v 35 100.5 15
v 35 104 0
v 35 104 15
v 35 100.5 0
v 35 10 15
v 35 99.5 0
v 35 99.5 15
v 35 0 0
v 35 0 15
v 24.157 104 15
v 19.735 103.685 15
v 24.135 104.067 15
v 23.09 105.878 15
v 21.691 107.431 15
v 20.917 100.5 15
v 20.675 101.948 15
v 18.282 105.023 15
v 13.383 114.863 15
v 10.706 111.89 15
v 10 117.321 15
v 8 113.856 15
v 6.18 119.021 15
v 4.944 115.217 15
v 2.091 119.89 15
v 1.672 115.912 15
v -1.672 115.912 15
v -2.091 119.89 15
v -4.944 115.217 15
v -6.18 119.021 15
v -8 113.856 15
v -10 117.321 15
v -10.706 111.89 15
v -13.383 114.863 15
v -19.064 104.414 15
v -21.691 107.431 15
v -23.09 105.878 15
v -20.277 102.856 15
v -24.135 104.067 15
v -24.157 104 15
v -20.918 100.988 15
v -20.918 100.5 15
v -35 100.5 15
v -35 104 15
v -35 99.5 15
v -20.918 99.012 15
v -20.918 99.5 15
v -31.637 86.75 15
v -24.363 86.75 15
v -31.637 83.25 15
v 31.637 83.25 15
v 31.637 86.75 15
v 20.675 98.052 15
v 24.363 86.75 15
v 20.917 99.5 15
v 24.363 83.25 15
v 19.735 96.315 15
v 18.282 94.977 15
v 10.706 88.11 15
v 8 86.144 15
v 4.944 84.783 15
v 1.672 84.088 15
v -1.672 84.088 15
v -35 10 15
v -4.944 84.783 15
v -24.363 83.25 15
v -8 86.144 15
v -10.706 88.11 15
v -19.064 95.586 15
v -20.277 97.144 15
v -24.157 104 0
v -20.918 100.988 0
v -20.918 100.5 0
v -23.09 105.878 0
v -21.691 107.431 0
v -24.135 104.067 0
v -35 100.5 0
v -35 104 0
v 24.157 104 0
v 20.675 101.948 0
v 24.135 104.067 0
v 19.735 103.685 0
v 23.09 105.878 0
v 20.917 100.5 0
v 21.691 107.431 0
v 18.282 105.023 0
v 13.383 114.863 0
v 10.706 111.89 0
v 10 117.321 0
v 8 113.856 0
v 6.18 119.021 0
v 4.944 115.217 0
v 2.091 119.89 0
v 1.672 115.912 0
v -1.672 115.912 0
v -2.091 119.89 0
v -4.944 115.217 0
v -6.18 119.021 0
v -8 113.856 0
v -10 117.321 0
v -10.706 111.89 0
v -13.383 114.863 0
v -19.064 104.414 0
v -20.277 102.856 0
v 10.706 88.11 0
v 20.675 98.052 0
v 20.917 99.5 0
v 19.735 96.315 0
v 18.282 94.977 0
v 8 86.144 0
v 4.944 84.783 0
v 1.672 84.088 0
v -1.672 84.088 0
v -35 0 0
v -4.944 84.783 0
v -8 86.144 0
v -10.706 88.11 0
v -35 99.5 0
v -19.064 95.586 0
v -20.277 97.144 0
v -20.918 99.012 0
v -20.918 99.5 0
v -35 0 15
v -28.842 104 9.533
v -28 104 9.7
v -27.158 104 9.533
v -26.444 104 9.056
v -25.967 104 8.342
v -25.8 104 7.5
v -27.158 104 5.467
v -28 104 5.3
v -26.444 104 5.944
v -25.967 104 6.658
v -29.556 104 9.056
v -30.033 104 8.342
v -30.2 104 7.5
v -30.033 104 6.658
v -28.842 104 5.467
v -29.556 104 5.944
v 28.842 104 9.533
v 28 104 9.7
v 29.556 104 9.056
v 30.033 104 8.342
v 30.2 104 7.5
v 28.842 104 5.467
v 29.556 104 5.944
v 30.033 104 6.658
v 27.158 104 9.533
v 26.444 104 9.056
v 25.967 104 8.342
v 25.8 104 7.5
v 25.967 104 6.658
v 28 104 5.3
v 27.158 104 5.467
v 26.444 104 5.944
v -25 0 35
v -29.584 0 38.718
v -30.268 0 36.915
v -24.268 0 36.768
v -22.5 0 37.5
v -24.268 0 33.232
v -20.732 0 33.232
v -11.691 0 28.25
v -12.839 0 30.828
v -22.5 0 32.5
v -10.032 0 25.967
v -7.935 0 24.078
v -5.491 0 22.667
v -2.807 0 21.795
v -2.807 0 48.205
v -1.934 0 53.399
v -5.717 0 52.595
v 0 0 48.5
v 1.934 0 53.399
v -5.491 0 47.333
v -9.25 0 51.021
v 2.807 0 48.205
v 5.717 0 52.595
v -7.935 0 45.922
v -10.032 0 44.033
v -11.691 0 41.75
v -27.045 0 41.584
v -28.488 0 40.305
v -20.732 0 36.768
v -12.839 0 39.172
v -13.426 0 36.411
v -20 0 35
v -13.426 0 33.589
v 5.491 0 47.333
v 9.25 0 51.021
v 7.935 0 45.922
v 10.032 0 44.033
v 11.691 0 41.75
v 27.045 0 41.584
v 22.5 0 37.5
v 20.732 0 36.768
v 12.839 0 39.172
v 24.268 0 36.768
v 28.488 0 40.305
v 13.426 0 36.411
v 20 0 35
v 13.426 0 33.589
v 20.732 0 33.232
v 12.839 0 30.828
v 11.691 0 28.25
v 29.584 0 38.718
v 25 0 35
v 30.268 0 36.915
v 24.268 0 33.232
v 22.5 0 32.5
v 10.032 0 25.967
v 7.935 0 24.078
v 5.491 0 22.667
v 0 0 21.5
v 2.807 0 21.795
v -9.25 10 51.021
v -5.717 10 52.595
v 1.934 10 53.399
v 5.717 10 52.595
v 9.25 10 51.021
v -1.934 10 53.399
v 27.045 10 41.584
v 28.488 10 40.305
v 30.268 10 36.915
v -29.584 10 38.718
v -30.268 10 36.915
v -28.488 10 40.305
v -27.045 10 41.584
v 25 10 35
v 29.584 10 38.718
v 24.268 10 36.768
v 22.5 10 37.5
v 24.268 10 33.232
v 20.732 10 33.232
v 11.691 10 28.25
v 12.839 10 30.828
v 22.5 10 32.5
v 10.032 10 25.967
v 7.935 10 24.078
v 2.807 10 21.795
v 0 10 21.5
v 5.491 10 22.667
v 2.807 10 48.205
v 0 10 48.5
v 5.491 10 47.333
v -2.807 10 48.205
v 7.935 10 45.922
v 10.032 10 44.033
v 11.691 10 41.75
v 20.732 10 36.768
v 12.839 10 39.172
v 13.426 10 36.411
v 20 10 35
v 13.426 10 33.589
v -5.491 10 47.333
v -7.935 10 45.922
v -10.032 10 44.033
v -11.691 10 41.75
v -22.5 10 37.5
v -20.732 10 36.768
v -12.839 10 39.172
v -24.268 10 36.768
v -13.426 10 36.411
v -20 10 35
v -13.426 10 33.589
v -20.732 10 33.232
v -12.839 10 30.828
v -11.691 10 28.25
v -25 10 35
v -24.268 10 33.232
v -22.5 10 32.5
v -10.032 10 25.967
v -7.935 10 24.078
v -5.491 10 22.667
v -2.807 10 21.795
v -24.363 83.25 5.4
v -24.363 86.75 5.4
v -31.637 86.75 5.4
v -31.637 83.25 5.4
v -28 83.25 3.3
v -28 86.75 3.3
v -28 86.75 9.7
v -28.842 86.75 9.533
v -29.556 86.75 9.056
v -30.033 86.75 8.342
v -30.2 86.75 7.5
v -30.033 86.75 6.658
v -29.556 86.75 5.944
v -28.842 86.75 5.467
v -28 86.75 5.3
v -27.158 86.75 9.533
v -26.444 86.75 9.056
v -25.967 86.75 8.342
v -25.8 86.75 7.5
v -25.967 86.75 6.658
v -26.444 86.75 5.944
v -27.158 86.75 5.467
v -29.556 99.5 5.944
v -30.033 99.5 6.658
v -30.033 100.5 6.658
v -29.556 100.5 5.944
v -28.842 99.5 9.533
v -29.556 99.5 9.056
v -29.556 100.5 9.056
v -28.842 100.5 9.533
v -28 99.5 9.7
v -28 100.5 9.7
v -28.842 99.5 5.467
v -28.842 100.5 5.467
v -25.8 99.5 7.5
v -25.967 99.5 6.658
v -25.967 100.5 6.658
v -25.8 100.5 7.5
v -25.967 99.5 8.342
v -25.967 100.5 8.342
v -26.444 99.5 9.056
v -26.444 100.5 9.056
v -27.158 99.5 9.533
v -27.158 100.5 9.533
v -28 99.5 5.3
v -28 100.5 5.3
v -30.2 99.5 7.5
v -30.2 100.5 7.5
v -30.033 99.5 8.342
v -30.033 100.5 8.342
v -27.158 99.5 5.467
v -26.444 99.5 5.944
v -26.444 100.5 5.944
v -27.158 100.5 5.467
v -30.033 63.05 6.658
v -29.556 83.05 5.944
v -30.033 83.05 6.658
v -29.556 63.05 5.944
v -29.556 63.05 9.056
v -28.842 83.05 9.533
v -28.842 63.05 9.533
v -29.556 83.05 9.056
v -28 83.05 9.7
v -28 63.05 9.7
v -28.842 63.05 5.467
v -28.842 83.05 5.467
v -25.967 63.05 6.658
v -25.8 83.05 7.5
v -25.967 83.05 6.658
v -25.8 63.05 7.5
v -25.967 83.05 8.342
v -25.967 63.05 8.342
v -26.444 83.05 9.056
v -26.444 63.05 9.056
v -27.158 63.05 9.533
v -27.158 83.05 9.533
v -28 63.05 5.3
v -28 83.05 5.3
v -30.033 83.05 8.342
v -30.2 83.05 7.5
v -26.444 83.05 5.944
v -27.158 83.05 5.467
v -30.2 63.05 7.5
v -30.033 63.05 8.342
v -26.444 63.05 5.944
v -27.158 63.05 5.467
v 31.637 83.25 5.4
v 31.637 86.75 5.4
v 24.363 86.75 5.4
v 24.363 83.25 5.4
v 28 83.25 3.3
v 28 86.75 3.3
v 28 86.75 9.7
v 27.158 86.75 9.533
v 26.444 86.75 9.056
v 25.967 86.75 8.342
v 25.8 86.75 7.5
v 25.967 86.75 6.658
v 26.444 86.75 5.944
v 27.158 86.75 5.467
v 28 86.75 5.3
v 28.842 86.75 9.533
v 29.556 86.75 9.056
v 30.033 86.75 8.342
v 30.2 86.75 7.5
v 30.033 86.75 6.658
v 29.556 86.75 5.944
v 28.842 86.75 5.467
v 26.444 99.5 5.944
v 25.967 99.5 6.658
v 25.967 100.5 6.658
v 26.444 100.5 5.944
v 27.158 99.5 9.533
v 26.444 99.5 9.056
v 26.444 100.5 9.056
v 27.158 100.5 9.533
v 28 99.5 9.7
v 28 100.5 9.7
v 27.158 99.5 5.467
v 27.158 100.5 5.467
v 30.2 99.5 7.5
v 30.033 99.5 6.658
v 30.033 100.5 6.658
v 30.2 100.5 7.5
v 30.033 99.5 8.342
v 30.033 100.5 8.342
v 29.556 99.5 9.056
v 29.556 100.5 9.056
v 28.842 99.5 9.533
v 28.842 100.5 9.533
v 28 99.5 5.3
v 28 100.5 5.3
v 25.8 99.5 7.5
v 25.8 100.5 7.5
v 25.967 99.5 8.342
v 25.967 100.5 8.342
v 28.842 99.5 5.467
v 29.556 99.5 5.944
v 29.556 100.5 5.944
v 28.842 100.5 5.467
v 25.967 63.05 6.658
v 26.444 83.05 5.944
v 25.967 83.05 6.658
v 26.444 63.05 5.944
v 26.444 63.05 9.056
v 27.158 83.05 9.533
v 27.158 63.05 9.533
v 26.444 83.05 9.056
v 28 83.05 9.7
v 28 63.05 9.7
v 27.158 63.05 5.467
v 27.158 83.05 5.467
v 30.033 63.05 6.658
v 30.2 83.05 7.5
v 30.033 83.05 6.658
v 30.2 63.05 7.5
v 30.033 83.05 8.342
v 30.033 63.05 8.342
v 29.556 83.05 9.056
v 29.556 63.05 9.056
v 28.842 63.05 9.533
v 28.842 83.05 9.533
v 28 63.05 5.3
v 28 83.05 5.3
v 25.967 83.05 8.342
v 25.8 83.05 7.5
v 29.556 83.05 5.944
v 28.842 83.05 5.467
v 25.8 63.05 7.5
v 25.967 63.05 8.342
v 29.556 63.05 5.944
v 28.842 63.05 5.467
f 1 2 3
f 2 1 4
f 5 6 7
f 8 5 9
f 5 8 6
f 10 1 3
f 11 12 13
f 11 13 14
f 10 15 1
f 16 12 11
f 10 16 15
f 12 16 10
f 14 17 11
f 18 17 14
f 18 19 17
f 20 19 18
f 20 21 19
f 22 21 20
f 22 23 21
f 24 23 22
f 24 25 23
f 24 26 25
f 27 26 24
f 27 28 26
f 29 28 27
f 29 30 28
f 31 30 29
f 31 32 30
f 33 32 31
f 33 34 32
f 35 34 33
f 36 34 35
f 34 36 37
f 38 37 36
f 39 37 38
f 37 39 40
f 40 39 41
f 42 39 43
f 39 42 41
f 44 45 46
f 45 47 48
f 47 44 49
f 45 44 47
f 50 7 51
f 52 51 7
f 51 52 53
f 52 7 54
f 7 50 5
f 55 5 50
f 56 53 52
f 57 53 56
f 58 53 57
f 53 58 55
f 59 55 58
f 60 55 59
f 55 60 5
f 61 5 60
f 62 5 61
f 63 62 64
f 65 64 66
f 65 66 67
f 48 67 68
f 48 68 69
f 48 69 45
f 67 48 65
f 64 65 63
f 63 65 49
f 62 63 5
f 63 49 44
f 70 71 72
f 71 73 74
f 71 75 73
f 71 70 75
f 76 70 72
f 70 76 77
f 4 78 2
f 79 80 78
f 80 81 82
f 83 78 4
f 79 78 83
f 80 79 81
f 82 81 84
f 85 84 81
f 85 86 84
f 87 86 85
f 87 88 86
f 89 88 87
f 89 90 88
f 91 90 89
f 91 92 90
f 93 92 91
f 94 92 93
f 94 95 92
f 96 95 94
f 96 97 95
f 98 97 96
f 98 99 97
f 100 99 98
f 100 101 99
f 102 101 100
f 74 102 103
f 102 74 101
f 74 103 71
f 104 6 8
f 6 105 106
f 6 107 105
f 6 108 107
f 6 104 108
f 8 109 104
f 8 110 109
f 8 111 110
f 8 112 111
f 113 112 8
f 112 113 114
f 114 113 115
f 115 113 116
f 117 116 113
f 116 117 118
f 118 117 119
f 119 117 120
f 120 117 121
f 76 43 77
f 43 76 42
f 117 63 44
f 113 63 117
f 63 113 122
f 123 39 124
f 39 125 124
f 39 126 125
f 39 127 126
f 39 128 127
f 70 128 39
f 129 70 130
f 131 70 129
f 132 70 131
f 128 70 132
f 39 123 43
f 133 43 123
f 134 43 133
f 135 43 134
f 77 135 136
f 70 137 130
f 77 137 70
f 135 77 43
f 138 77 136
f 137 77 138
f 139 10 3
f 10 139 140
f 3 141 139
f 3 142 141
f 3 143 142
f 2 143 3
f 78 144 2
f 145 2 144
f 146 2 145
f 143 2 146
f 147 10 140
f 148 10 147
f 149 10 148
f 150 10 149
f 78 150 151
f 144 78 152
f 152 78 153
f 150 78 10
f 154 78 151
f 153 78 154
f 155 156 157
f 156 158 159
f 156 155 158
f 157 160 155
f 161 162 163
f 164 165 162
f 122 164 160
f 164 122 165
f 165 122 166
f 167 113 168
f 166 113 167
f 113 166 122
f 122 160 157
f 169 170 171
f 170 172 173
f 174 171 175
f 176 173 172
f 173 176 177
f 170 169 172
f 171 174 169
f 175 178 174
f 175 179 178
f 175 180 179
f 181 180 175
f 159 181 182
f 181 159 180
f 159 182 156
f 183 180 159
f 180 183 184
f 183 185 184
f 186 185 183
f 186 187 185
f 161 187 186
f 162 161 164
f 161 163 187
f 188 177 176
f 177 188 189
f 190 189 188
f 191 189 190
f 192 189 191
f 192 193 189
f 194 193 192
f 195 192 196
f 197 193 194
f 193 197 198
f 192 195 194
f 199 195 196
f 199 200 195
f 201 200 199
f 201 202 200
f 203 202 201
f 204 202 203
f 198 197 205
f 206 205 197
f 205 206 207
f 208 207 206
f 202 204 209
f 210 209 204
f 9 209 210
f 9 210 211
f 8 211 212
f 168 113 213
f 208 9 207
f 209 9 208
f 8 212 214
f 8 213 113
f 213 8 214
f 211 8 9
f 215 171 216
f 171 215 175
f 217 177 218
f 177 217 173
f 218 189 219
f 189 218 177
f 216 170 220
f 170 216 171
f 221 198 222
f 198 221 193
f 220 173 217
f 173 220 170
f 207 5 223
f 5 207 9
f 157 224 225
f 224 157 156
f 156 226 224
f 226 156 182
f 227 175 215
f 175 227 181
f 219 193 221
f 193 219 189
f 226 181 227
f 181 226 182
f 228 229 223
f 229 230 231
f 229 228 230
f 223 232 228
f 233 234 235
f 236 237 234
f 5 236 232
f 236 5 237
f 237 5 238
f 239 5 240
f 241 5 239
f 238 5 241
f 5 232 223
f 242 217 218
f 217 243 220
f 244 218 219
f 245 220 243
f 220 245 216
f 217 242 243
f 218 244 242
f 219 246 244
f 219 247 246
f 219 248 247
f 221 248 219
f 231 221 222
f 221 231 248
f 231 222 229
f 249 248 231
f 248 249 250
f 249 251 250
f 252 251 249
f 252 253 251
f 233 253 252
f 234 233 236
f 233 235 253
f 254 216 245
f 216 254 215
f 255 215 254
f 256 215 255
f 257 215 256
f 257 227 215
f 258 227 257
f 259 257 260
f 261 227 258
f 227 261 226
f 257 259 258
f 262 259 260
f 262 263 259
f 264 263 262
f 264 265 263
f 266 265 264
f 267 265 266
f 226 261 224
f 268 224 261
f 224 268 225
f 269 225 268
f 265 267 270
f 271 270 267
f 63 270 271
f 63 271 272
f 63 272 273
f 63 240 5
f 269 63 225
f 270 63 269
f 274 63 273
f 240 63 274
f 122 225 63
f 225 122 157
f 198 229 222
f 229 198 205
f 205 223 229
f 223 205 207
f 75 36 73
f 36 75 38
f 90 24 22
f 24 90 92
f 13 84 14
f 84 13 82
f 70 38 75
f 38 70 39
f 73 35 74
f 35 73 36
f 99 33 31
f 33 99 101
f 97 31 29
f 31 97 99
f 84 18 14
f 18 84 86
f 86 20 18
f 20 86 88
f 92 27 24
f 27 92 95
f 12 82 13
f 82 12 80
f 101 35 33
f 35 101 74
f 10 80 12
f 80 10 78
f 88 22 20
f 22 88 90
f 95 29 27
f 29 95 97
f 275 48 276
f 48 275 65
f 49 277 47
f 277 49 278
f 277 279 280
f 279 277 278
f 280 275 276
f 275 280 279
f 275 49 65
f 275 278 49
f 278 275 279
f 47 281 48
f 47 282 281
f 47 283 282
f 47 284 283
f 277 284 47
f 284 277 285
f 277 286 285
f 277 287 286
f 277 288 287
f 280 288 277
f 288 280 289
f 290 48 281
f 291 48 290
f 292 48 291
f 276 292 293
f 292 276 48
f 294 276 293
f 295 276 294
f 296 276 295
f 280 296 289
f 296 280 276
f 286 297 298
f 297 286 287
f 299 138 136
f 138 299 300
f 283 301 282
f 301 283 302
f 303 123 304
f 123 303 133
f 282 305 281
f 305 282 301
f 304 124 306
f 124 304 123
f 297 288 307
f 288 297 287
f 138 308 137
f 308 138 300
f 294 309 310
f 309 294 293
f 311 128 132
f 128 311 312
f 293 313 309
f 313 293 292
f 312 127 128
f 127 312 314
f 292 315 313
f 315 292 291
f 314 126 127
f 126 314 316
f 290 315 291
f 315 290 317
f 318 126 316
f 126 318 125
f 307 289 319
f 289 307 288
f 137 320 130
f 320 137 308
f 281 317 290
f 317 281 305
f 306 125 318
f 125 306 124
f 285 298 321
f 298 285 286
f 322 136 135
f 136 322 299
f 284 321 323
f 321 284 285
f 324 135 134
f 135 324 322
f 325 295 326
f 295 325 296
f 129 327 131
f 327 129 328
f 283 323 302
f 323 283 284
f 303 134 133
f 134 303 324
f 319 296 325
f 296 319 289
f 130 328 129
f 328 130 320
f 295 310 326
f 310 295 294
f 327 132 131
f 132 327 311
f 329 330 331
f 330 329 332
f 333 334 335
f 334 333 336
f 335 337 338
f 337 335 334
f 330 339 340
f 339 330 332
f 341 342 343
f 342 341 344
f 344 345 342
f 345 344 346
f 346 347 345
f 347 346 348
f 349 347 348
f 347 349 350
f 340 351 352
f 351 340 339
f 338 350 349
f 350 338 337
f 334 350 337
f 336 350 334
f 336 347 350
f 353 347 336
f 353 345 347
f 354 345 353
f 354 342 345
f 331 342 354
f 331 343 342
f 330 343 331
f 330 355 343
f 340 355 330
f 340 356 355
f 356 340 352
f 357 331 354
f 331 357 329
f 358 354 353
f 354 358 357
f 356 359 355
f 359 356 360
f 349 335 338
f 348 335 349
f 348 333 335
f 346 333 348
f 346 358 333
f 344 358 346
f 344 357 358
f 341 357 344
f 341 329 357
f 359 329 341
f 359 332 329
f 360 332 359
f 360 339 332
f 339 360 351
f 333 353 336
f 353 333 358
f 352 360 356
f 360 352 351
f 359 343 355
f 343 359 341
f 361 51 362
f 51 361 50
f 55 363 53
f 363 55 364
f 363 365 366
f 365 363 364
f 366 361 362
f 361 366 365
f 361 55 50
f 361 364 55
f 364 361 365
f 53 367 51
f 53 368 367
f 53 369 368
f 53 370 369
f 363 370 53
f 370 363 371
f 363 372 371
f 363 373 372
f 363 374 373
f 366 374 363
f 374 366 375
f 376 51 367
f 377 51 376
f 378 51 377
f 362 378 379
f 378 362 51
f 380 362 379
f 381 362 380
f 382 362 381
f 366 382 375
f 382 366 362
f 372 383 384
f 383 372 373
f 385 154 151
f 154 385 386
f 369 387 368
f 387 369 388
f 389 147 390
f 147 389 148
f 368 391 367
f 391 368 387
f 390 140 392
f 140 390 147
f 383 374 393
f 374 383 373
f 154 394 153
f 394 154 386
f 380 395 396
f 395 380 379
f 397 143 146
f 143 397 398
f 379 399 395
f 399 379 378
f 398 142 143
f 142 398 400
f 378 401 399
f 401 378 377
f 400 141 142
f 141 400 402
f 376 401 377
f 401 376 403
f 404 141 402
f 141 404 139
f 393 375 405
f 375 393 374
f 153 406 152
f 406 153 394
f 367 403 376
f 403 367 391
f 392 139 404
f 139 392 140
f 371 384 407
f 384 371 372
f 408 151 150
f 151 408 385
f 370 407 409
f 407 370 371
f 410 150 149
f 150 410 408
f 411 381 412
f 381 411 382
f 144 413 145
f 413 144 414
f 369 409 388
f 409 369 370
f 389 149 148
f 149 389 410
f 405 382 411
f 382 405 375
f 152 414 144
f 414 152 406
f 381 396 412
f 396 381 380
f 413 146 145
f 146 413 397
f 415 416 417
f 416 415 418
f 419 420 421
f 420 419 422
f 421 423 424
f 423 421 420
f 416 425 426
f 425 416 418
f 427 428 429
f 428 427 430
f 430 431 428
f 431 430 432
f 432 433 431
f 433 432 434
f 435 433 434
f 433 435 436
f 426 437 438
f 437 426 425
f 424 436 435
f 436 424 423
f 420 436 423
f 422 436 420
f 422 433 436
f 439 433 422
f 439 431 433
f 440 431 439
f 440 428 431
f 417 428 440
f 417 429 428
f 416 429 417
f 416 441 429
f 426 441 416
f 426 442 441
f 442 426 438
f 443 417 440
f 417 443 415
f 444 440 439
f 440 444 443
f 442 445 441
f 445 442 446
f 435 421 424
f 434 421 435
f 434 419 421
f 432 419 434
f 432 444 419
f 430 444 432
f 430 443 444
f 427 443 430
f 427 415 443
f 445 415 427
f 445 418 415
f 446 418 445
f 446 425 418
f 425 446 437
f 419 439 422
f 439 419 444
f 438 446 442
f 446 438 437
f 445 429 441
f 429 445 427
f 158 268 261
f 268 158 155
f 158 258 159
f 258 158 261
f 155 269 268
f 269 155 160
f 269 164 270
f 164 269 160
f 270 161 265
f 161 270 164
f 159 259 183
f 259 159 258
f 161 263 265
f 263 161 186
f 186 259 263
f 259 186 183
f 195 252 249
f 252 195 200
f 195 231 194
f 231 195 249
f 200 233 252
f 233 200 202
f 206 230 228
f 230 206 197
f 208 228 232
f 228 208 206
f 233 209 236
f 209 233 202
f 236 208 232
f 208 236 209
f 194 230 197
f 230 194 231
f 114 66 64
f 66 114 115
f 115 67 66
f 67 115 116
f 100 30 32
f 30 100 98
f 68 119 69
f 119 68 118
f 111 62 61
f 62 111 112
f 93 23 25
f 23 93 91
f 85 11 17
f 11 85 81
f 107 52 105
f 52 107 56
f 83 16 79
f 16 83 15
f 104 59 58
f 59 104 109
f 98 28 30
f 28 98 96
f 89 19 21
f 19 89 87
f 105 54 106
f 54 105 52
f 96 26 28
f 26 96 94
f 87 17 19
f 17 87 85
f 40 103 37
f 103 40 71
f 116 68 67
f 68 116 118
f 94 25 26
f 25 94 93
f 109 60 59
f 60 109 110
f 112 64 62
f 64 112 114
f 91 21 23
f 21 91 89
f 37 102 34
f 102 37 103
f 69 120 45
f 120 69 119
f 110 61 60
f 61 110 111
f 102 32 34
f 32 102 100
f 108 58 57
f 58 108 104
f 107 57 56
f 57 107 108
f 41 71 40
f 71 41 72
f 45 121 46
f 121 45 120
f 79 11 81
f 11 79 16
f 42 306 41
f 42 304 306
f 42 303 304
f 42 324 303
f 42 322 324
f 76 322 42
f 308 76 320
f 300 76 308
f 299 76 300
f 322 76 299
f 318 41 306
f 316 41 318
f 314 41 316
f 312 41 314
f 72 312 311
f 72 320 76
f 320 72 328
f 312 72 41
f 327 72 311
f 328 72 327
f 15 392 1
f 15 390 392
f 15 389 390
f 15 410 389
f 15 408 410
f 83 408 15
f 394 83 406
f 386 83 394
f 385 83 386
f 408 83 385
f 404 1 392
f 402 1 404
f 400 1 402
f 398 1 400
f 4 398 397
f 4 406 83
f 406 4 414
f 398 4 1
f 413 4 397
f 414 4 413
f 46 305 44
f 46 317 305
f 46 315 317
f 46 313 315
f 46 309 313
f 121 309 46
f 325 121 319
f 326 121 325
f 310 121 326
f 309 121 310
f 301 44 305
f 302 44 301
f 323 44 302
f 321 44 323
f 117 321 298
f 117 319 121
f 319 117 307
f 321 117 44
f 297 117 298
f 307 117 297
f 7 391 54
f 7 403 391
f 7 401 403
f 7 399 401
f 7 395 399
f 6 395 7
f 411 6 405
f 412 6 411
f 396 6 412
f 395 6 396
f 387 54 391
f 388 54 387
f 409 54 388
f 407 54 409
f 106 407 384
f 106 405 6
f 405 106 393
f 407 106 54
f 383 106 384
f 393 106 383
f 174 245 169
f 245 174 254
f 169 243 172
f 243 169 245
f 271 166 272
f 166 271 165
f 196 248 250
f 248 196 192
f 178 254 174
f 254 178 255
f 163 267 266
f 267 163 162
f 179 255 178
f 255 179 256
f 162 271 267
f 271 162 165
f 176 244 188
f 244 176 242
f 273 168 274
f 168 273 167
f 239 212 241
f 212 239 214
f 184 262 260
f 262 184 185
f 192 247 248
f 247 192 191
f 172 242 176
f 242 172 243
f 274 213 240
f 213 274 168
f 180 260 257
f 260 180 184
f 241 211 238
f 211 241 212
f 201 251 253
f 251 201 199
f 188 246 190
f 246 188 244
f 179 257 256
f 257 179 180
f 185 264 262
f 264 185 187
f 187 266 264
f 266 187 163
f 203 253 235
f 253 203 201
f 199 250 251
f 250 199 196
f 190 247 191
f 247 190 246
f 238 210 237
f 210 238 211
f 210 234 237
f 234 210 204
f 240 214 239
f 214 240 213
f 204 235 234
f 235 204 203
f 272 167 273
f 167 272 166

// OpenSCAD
// file: telephone.scad
include <config.scad>

tel_l = 141;
tel_lg = 74;
tel_e = 12;
tel_e2 = 8;
e = 2;

tel_ecran_lg = 65;
tel_ecran_h = 115;

module tel(l = tel_l, ecran = true){
    difference(){
        translate([-tel_lg/2, 0,0])cube([tel_lg, tel_e, l]);
        translate([-tel_lg/2+5, 0,-1])cylinder(r = (tel_e - tel_e2), l+2);
        translate([ tel_lg/2-5, 0,-1])cylinder(r = (tel_e - tel_e2), l+2);
    }
    if(ecran){
        translate([-tel_ecran_lg/2,tel_e2,10])cube([tel_ecran_lg, 20, tel_ecran_h]);
        translate([-10, 0, -5])cube([20, 20, 20]);
        translate([-tel_lg/2-2*e,tel_e-tel_e2,68])cube([tel_ecran_lg, tel_e2, 40]);
    }
}


module test(){
    difference(){
        translate([-tel_lg/2-2, -2,0])cube([tel_lg+4, tel_e+4, 10]);
        tel();
    }
}

module full_support(){
    difference(){
        translate([-tel_lg/2-e, -e,0])cube([tel_lg+2*e, tel_e+2*e, tel_l+2*e]);
        translate([0,0, e])tel(tel_l+2*e);
        
    }
}

module support_venti(lg, l){
    e1 = 2;
    e2 = 3;
    e3 = 2;
    l1 = 12;
    difference(){
        union(){
            cube([l1, e1 + e2 + e3, lg]);
            cube([l, e1, lg]);
        }
        translate([4, e1, -1])cube([l1-4-0.2, e2, lg + 2]);
    }
}

module support_voiture(){
    l = 37;
    l2 = 60;
    difference(){
        translate([0, 0, l2]) rotate([0,180,0])full_support();
        translate([-100, -100, -100]) cube([200,200,100]);
        translate([-10, 0, l2-10]) cube([20,20,20]);
    }
    for(i = [-1,1]){
        translate([i*20, -l, 0]) rotate([90, 0, 90])support_venti(5, l);
    }
}


full_support();
// main file
use <config.scad>
use <telephone.scad>

lg = 20;
e = 8;

l = 180;

t = [-l/2+10, 0, l/2-10];
angle_tracteur = -15;
x_support_tracteur = 40;
x_support_pulve = -40;

module support_pulve(h, e){
    l1 = 42;
    r1 = 32/2;
    r2 = 12/2;
    hull(){
        cylinder(h, r = r1 + e, center = true);
        translate([-l1/2+r2, 0,0]) cylinder(h, r = r2 + e, center = true);
        translate([l1/2-r2, 0,0]) cylinder(h, r = r2 + e, center = true);
        
    }
}


module support_same130(){
    difference(){
        union(){
            cube([l,2*e+2, lg], center = true);
            translate([x_support_tracteur, 0,0])support(lg, e);
            translate([x_support_pulve,0,0]) support_pulve(lg, e);
        }
        cube([400,2,400], center = true);
        for(i=t){
           translate([i,0,0]) rotate([90,0,0])cylinder(3*e, r = 4, center = true);
        }
        translate([x_support_tracteur, 0,0]) support(lg+1, 0);
        translate([x_support_pulve,0,0]) support_pulve(lg+1, 0);
    }
}


module support_tel_same130(){
    tel_l = 70;
    h = 15;
    h2 = 50;
    y_support = 100;
    e = 4;
    h_12v = 35;
    h_12v_lg = 45;
    difference(){
        union(){
            translate([-tel_l/2,0,0]) cube([tel_l, y_support+e, h]);
            
            hull(){
                translate([0,0,h_12v]) rotate([-90,0,0])cylinder(10, r = 27/2+5);
                for(i=[-1,1]){
                    translate([i*h_12v_lg/2, 0,h_12v]) rotate([-90,0,0])cylinder(10, r = 8);
                }
                translate([-tel_l/2,0,0]) cube([tel_l, 10, h]);
            
            }
            //translate([-tel_l/2,0,0]) cube([tel_l, 10, h+39]);
            translate([0,y_support,h/2]) support_pulve(h, e);
        }
        
        translate([0,y_support,10]) support_pulve(h2+1, 0);
        translate([0,y_support,0]) cube([100,1, 100], center =true);
        
        for(i=[-1,1]){
           %translate([i*28,y_support,h/2]) rotate([-90,0,0])cylinder(100, r = 2, center=true);
           translate([i*28,y_support-15,h/2]) rotate([90,-90,0])support_nut(4);
        }
        
        
        translate([0,0,h_12v]) rotate([90,-90,0])cylinder(100, r = 27/2, center=true);
        for(i=[-1,1]){
            translate([i*h_12v_lg/2, 0,h_12v]) rotate([90,-90,0])cylinder(100, r = 5/2, center=true);
        }
             
        %translate([0,y_support,0]) support_pulve(60, 0);
        
    }
    
}



support_tel_same130();
